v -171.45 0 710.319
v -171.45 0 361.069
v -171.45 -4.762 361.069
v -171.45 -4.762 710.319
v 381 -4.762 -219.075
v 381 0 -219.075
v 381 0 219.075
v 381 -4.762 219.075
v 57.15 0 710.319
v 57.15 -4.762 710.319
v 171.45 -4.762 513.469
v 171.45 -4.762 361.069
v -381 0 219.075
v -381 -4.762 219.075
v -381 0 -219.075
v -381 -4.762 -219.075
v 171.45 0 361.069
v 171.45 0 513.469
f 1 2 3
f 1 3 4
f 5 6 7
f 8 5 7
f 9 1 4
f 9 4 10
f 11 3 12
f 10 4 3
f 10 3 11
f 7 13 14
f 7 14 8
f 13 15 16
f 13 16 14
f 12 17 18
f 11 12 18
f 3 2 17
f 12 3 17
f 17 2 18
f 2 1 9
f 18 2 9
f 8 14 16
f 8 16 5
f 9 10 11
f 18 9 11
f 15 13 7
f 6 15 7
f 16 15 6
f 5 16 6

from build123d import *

# Parameters (mm, degrees)
F0_W     = 762
F0_H     = 438.15
F1_DEPTH = 4.7625
F2_W     = 342.9
F2_H     = 349.25
F3_DEPTH = 4.7625
F5_DEPTH = 4.7625


with BuildPart() as f1:
    # F0 (on Front) → F1 (new body)
    with BuildSketch(Plane.XZ):
        Rectangle(F0_W, F0_H)
    extrude(amount=F1_DEPTH)


with BuildPart() as f3:
    # F2 (on Front) → F3 (new body)
    with BuildSketch(Plane.XZ):
        with Locations((0, 535.694007)):
            Rectangle(F2_W, F2_H)
    extrude(amount=F3_DEPTH)

    # F4 (on face) → F5 (cut, through all)
    with BuildSketch(Plane.XZ.offset(4.7625)):
        Polygon((57.15, 710.319007), (171.45, 513.469007), (171.45, 710.319007), align=None)
    extrude(amount=-F5_DEPTH, mode=Mode.SUBTRACT)


solid = Compound([f1.part, f3.part])
